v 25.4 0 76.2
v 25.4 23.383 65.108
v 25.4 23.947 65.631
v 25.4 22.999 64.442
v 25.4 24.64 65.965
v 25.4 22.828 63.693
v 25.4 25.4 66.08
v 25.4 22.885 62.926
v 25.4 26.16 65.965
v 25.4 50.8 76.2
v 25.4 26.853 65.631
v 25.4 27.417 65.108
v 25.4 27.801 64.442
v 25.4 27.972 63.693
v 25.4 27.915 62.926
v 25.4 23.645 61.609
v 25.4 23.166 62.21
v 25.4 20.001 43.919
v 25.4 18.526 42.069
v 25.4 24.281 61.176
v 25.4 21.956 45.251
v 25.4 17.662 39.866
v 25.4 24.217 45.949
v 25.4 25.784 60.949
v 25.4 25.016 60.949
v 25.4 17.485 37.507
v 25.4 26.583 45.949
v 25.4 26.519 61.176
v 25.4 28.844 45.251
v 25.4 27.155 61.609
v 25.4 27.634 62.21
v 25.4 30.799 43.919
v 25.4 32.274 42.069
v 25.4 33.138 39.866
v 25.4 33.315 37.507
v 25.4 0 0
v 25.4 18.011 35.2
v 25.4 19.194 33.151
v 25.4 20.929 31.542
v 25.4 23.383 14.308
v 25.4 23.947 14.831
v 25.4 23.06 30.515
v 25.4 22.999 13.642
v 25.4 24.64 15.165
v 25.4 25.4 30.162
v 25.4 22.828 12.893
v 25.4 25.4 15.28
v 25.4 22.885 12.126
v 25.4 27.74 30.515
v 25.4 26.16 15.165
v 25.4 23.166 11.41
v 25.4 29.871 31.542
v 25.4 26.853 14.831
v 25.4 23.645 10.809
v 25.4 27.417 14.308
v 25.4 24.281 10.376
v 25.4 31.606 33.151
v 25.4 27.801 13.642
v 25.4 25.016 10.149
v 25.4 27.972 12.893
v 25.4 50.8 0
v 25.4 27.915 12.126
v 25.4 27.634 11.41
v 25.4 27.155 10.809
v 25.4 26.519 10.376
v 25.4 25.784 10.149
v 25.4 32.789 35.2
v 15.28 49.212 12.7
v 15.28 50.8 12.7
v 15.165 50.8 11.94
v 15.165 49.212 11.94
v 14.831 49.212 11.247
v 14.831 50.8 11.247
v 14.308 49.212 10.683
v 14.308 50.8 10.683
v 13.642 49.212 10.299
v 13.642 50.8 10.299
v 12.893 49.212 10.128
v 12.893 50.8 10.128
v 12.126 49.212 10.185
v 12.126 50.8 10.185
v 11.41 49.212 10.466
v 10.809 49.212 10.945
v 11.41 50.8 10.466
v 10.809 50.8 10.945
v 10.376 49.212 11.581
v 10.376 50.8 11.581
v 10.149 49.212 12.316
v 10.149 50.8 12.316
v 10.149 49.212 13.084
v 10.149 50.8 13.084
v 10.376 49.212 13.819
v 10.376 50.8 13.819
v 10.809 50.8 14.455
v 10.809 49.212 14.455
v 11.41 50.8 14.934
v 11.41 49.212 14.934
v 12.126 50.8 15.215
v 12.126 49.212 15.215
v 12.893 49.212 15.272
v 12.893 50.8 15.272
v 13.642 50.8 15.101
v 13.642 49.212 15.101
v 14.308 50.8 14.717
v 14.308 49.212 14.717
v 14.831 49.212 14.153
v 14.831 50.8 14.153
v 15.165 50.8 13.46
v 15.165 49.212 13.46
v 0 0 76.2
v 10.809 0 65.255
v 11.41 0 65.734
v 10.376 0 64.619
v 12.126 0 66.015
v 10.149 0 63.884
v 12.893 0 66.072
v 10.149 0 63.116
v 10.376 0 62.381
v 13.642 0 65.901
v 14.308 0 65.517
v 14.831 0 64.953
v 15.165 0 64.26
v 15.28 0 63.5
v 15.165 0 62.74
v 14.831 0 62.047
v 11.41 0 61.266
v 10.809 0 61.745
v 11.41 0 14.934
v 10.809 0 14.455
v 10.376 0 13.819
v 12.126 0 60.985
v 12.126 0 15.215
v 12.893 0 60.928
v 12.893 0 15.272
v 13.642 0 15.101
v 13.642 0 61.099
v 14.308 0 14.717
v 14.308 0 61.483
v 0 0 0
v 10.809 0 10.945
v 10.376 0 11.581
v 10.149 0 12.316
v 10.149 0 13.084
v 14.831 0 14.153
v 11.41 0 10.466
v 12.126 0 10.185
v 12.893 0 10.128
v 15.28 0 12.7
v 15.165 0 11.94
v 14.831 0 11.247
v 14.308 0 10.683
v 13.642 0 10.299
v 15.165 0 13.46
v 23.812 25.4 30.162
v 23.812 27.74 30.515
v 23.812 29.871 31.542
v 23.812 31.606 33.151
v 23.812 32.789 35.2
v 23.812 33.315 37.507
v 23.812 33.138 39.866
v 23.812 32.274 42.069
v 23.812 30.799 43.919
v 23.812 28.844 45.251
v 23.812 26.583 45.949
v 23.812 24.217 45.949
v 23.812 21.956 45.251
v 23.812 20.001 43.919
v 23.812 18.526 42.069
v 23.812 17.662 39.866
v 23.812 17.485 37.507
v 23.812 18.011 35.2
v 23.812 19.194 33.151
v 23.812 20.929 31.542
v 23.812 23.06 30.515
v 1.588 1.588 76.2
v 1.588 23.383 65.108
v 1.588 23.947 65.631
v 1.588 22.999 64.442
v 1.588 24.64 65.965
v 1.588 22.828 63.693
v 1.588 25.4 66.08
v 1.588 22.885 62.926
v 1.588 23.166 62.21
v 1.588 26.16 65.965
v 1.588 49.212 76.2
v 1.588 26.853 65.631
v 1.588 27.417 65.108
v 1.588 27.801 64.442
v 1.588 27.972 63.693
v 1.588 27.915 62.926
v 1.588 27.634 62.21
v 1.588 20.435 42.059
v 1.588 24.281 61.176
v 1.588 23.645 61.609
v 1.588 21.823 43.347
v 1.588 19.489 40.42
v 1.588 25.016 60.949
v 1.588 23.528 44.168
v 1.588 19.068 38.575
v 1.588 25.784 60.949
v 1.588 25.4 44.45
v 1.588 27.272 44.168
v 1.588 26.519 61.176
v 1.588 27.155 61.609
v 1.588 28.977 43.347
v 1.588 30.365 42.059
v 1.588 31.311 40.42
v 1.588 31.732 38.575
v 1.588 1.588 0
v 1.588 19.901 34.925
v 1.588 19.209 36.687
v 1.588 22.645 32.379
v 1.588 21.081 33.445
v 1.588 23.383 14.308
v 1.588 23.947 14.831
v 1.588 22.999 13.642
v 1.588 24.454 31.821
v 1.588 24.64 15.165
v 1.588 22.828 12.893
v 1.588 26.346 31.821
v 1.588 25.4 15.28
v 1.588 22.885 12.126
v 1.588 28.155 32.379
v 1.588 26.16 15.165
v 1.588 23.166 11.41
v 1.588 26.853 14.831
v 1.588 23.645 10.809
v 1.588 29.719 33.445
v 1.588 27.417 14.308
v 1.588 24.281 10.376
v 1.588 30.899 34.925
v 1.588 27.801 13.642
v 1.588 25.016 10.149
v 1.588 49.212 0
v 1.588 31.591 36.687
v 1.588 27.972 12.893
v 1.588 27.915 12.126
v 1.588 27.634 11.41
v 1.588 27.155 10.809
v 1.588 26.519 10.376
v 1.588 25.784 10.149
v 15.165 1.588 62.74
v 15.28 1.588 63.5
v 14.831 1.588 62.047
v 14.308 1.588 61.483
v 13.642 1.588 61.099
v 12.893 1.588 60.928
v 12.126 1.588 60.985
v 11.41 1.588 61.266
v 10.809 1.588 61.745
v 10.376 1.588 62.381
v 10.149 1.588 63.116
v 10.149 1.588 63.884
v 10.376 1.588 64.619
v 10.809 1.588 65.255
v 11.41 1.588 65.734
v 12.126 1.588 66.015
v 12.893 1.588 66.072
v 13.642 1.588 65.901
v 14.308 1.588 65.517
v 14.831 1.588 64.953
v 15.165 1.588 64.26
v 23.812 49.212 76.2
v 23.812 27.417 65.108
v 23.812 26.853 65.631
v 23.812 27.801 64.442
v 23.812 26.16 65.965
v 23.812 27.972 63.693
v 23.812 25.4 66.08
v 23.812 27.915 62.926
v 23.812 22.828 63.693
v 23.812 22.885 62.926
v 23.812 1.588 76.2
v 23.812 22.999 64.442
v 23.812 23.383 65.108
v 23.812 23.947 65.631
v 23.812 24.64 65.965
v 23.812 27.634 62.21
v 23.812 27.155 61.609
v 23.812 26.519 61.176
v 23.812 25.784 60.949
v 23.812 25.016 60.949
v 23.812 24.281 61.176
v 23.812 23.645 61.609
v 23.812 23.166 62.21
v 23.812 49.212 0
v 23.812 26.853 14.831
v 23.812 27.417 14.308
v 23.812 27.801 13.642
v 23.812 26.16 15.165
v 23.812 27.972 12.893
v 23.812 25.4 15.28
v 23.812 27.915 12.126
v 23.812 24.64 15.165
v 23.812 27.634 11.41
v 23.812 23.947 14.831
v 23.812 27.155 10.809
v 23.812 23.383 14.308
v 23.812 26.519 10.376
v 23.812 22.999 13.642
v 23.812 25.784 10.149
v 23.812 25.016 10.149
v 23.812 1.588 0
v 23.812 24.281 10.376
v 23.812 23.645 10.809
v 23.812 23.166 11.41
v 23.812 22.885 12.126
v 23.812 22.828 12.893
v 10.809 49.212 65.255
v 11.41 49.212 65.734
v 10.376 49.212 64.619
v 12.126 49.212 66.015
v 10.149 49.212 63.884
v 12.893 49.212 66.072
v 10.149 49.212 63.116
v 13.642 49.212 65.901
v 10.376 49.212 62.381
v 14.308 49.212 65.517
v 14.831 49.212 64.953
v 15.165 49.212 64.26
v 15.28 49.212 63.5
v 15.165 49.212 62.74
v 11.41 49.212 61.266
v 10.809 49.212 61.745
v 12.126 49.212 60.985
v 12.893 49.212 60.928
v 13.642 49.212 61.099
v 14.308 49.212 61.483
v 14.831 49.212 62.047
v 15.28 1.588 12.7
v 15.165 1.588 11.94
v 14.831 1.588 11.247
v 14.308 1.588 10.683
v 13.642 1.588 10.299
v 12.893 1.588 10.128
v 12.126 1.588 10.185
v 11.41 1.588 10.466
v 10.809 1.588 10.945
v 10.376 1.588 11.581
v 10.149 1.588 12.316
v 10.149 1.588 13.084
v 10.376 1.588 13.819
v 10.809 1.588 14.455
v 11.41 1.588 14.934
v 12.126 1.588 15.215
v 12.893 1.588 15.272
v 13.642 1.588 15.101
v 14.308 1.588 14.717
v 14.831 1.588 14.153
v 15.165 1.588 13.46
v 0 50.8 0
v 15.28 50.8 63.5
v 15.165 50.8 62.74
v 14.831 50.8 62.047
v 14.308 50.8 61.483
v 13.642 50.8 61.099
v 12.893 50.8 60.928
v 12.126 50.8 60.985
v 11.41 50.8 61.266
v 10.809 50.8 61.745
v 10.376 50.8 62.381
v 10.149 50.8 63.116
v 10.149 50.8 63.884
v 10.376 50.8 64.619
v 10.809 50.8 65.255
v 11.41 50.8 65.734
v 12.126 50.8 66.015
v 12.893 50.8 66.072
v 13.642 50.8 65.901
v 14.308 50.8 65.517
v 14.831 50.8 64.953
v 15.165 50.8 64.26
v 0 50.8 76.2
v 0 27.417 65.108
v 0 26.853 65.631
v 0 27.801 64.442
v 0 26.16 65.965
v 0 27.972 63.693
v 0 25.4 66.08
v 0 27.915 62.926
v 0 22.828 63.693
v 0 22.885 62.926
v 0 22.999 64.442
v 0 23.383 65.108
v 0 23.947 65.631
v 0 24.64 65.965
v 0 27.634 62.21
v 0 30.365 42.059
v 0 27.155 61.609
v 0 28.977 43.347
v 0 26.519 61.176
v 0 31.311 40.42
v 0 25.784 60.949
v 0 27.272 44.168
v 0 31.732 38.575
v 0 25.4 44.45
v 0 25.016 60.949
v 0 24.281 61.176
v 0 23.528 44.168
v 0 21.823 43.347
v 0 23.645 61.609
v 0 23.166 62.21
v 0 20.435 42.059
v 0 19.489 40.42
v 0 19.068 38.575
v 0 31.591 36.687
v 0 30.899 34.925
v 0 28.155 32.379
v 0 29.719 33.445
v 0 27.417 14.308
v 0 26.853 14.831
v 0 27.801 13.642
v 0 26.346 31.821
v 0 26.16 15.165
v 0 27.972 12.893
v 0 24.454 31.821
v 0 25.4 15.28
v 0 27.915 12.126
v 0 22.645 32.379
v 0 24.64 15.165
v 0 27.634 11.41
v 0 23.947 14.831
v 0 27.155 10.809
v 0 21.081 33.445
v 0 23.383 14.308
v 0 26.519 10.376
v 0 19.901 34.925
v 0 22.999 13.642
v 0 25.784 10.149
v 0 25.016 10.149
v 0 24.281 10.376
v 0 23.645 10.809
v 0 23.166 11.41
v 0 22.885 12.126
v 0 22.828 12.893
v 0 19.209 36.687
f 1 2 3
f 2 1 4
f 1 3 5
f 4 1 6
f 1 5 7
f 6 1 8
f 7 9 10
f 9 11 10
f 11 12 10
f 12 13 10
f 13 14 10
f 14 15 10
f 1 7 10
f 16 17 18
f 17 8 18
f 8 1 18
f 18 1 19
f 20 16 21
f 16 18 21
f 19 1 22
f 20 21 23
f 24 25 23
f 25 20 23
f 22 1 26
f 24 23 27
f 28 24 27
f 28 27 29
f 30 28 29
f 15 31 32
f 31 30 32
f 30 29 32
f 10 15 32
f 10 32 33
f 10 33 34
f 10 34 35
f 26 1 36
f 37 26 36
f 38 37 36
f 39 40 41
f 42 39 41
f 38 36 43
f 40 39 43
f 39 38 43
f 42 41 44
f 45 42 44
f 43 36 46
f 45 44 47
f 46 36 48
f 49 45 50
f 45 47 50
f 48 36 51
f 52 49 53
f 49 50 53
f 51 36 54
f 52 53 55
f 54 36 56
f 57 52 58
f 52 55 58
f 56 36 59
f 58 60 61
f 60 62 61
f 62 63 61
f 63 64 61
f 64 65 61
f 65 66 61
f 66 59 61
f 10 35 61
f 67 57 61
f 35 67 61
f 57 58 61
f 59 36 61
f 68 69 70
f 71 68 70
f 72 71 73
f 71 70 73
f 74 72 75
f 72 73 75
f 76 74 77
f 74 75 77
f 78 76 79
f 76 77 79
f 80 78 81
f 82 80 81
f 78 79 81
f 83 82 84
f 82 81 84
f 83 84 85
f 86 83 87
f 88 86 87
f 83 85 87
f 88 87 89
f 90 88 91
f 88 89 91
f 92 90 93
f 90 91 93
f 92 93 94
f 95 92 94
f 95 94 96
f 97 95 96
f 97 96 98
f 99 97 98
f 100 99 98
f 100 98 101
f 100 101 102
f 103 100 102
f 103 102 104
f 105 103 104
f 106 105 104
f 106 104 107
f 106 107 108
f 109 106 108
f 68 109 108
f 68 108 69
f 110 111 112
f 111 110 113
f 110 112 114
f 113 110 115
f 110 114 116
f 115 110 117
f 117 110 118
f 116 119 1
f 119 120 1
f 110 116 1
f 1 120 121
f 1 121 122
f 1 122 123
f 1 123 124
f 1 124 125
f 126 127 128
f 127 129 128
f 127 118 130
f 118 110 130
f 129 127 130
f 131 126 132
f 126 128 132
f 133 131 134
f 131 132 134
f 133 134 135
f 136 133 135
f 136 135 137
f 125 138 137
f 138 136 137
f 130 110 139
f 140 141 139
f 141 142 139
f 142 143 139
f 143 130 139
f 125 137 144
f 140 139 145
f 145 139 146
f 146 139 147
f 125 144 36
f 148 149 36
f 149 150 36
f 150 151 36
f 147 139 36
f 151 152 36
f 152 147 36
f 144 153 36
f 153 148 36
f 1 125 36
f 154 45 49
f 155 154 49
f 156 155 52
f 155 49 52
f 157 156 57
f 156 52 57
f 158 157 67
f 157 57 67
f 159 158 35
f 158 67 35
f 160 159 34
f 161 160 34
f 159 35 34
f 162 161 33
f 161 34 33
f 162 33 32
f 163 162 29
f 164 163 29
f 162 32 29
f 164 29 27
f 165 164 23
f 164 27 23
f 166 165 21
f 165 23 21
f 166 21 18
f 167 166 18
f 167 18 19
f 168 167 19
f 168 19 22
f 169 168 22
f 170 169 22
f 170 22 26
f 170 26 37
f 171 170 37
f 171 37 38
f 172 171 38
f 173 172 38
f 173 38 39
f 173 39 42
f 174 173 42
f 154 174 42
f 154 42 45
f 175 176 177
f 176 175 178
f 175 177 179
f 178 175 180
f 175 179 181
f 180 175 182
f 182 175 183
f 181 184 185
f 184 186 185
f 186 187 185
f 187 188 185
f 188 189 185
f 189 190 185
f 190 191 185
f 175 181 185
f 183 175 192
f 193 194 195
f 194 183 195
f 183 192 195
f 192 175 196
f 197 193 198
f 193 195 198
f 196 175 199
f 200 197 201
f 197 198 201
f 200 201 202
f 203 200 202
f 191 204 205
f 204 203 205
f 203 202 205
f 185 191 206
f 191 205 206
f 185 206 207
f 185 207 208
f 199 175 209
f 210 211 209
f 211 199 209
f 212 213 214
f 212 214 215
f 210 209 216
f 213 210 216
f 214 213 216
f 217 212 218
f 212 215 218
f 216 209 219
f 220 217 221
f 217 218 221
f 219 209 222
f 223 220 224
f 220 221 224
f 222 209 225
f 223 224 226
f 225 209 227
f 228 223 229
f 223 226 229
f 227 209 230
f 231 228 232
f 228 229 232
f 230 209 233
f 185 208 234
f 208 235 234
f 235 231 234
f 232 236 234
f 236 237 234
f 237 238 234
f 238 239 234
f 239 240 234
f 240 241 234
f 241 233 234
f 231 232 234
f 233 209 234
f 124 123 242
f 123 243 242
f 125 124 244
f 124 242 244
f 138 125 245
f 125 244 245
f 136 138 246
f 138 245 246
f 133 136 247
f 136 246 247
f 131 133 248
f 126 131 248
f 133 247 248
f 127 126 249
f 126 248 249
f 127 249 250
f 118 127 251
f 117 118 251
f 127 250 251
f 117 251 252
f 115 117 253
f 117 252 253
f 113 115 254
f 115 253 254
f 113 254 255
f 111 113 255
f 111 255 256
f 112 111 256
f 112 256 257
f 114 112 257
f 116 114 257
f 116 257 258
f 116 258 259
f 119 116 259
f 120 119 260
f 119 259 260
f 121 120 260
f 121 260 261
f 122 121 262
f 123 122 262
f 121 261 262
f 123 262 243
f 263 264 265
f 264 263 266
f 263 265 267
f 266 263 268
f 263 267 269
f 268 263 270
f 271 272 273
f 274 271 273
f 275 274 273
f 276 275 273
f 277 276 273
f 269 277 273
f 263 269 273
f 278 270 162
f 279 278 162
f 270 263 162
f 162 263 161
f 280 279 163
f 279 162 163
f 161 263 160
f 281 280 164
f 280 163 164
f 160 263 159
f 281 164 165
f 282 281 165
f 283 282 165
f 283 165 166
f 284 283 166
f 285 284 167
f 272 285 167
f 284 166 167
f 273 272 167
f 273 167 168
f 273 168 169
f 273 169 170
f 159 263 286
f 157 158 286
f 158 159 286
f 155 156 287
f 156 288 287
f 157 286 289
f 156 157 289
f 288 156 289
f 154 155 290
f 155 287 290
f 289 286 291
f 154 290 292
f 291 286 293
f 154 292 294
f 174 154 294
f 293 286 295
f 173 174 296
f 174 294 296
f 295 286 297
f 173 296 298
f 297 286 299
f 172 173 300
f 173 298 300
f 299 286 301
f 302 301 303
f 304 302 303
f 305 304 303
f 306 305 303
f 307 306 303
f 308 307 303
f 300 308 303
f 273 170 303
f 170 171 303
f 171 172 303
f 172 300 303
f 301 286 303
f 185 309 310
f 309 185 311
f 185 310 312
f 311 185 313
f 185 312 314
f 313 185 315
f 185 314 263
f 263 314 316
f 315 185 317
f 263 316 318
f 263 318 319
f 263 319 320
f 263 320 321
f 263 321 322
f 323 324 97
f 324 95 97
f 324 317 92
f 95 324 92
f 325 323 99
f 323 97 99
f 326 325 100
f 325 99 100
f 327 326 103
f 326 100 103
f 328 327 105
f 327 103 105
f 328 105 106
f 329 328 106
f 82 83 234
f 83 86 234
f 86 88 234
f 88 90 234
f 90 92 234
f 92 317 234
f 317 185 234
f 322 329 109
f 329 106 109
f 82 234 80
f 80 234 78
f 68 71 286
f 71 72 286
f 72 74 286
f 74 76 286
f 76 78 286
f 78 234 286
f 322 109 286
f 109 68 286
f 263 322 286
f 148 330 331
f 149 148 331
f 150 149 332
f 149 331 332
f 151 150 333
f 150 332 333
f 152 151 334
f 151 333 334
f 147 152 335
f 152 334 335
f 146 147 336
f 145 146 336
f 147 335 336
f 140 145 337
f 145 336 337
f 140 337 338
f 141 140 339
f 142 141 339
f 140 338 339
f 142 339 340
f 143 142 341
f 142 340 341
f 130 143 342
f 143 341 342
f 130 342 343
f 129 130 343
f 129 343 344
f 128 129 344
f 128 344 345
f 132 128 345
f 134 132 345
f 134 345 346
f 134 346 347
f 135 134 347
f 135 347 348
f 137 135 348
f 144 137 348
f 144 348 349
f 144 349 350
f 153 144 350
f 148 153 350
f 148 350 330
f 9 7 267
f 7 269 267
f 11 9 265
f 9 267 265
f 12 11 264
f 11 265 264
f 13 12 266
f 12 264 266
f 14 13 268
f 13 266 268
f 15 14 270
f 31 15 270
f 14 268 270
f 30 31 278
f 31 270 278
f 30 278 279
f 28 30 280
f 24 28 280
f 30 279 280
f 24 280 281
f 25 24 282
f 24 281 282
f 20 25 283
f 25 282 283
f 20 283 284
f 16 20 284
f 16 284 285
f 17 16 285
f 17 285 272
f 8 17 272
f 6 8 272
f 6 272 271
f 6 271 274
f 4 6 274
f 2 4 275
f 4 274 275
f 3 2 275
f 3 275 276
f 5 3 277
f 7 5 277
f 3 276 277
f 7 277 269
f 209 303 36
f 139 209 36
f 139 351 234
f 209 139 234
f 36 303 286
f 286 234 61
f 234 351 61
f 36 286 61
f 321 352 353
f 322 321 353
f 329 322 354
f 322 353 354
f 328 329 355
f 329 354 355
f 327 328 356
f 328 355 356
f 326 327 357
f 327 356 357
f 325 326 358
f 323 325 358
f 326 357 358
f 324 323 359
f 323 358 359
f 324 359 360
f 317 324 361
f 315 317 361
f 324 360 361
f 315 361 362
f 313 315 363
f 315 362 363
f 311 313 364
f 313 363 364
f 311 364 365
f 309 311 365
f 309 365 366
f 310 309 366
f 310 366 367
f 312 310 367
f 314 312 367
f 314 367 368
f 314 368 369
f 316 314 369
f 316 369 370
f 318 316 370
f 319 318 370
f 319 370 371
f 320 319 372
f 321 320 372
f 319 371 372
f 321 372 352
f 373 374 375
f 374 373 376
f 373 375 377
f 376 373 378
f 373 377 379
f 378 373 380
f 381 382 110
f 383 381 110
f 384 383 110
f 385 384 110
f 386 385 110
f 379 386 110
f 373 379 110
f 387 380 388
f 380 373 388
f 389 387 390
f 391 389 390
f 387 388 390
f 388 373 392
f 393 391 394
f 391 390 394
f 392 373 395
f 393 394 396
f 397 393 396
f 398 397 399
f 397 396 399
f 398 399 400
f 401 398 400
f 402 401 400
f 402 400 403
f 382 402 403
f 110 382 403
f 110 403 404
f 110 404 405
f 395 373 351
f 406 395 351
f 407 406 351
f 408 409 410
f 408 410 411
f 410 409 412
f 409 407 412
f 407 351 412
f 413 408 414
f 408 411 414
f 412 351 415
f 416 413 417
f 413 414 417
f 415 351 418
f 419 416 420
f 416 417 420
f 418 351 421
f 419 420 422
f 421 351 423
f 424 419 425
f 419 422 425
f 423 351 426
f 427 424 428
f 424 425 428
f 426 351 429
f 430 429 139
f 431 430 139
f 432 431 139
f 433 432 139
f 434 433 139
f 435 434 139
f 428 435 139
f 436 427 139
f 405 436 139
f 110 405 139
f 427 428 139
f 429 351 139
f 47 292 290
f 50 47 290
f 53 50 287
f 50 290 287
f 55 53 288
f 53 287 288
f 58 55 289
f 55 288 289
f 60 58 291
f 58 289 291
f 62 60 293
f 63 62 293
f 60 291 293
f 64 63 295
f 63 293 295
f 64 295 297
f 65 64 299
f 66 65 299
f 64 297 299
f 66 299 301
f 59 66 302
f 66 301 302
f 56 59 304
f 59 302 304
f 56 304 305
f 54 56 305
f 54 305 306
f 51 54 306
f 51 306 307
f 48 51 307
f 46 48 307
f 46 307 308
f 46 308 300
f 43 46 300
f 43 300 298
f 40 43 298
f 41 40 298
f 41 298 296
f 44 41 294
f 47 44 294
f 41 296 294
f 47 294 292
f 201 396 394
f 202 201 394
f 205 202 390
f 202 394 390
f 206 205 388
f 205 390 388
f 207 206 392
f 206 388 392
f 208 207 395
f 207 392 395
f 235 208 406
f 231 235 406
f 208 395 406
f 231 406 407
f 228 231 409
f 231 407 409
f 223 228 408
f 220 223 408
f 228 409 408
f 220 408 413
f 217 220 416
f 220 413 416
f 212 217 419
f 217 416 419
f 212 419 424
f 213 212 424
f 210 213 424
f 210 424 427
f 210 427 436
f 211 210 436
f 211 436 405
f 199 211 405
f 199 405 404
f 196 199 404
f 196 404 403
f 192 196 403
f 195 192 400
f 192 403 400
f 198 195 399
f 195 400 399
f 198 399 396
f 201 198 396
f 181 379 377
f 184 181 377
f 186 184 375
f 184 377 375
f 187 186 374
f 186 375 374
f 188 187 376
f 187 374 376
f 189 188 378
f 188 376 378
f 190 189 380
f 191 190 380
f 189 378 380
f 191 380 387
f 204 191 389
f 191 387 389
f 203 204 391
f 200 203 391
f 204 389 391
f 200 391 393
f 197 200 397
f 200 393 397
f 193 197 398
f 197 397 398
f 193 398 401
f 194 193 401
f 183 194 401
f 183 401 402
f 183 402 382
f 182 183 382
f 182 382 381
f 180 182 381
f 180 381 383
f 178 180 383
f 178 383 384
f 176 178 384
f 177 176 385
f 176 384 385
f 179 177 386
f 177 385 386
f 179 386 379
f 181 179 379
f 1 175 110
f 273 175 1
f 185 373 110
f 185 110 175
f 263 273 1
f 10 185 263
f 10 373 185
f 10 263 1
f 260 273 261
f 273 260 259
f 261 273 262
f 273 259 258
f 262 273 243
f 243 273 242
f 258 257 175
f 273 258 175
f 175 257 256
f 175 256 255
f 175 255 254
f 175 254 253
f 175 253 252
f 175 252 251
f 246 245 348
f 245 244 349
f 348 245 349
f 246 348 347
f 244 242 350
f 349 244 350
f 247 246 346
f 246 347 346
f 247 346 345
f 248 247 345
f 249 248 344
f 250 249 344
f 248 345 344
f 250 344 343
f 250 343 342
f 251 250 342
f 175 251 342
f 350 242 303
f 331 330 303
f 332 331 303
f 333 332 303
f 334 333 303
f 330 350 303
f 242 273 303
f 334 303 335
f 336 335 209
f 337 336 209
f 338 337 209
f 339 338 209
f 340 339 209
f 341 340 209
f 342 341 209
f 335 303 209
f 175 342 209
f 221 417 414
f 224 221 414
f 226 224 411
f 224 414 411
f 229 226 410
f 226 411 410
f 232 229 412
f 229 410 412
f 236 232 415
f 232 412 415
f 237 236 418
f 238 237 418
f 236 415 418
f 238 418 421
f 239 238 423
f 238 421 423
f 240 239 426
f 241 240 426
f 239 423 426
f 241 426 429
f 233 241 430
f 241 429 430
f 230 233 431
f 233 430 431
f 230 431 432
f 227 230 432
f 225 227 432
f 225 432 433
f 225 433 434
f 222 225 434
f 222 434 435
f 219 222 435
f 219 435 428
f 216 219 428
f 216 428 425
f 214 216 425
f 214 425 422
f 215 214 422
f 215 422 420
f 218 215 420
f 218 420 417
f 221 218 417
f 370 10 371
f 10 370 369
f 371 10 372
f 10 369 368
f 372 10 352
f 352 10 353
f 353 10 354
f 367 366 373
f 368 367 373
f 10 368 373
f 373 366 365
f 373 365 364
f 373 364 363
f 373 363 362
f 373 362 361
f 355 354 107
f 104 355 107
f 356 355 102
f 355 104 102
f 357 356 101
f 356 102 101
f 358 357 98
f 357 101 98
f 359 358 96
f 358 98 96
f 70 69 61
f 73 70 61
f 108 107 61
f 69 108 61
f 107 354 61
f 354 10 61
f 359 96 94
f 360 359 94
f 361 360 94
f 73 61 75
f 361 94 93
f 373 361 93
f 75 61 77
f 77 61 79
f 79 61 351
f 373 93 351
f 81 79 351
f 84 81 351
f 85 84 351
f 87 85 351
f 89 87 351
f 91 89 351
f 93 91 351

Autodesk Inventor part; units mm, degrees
ref_plane "YZ Plane" through (0, 0, 0) normal (1, 0, 0) x (0, 1, 0)
ref_plane "XZ Plane" through (0, 0, 0) normal (0, 1, 0) x (-1, 0, 0)
ref_plane "XY Plane" through (0, 0, 0) normal (0, 0, 1) x (1, 0, 0)
sketch "Sketch1" plane through (0, 0, 0) normal (0, 0, 1) x (1, 0, 0)
  line L0 (0, 0) -> (25.4, 0)
  line L1 (25.4, 0) -> (25.4, 50.8)
  line L2 (25.4, 50.8) -> (0, 50.8)
  line L3 (0, 50.8) -> (0, 0)
  line L4 (1.5875, 49.2125) -> (23.8125, 49.2125)
  line L5 (23.8125, 49.2125) -> (23.8125, 1.5875)
  line L6 (23.8125, 1.5875) -> (1.5875, 1.5875)
  line L7 (1.5875, 1.5875) -> (1.5875, 49.2125)
  dimension "d0" = 25.4
  dimension "d1" = 50.8
  dimension "d2" = 1.5875
extrude "Extrusion1" add sketch "Sketch1" along normal blind 76.2
sketch "Sketch2" plane through (25.4, 0, 0) normal (1, 0, 0) x (0, 0, -1)
  circle A0 centre (-38.1, 25.4) radius 7.9375
  point P0 (0, 0)
  dimension "d5" = 15.875
extrude "Extrusion2" cut sketch "Sketch2" against normal blind 4.7625
sketch "Sketch3" plane through (0, 0, 0) normal (-1, 0, 0) x (0, 0, 1)
  circle A0 centre (38.1, 25.4) radius 7.9375 projected
  circle A1 centre (38.1, 25.4) radius 6.35
  point P0 (0, 0)
  dimension "d8" = 12.7
extrude "Extrusion3" cut sketch "Sketch3" against normal blind 4.7625 contours A1
sketch "Sketch4" plane through (0, 0, 0) normal (-1, 0, 0) x (0, 0, 1)
  line L0 (0, 1.5875) -> (0, 49.2125) construction
  line L1 (0, 25.4) -> (12.7, 25.4) construction
  line L2 (12.7, 25.4) -> (63.5, 25.4) construction
  circle A0 centre (12.7, 25.4) radius 2.5797
  circle A1 centre (63.5, 25.4) radius 2.5797
  point P0 (0, 0)
  dimension "d11" = 12.7
  dimension "d12" = 50.8
  dimension "d13" = 5.1594
extrude "Extrusion4" cut sketch "Sketch4" against normal blind 55.5625
sketch "Sketch5" plane through (0, 50.8, 0) normal (0, 1, 0) x (1, 0, 0)
  line L0 (23.8125, 0) -> (1.5875, 0) construction
  line L1 (12.7, 0) -> (12.7, -12.7) construction
  line L2 (12.7, -12.7) -> (12.7, -63.5) construction
  circle A0 centre (12.7, -12.7) radius 2.5797
  circle A1 centre (12.7, -63.5) radius 2.5797
  point P0 (0, 0)
  dimension "d16" = 12.7
  dimension "d17" = 50.8
  dimension "d18" = 5.1594
extrude "Extrusion5" cut sketch "Sketch5" against normal blind 66.675
properties part number "new piston mount v1"
